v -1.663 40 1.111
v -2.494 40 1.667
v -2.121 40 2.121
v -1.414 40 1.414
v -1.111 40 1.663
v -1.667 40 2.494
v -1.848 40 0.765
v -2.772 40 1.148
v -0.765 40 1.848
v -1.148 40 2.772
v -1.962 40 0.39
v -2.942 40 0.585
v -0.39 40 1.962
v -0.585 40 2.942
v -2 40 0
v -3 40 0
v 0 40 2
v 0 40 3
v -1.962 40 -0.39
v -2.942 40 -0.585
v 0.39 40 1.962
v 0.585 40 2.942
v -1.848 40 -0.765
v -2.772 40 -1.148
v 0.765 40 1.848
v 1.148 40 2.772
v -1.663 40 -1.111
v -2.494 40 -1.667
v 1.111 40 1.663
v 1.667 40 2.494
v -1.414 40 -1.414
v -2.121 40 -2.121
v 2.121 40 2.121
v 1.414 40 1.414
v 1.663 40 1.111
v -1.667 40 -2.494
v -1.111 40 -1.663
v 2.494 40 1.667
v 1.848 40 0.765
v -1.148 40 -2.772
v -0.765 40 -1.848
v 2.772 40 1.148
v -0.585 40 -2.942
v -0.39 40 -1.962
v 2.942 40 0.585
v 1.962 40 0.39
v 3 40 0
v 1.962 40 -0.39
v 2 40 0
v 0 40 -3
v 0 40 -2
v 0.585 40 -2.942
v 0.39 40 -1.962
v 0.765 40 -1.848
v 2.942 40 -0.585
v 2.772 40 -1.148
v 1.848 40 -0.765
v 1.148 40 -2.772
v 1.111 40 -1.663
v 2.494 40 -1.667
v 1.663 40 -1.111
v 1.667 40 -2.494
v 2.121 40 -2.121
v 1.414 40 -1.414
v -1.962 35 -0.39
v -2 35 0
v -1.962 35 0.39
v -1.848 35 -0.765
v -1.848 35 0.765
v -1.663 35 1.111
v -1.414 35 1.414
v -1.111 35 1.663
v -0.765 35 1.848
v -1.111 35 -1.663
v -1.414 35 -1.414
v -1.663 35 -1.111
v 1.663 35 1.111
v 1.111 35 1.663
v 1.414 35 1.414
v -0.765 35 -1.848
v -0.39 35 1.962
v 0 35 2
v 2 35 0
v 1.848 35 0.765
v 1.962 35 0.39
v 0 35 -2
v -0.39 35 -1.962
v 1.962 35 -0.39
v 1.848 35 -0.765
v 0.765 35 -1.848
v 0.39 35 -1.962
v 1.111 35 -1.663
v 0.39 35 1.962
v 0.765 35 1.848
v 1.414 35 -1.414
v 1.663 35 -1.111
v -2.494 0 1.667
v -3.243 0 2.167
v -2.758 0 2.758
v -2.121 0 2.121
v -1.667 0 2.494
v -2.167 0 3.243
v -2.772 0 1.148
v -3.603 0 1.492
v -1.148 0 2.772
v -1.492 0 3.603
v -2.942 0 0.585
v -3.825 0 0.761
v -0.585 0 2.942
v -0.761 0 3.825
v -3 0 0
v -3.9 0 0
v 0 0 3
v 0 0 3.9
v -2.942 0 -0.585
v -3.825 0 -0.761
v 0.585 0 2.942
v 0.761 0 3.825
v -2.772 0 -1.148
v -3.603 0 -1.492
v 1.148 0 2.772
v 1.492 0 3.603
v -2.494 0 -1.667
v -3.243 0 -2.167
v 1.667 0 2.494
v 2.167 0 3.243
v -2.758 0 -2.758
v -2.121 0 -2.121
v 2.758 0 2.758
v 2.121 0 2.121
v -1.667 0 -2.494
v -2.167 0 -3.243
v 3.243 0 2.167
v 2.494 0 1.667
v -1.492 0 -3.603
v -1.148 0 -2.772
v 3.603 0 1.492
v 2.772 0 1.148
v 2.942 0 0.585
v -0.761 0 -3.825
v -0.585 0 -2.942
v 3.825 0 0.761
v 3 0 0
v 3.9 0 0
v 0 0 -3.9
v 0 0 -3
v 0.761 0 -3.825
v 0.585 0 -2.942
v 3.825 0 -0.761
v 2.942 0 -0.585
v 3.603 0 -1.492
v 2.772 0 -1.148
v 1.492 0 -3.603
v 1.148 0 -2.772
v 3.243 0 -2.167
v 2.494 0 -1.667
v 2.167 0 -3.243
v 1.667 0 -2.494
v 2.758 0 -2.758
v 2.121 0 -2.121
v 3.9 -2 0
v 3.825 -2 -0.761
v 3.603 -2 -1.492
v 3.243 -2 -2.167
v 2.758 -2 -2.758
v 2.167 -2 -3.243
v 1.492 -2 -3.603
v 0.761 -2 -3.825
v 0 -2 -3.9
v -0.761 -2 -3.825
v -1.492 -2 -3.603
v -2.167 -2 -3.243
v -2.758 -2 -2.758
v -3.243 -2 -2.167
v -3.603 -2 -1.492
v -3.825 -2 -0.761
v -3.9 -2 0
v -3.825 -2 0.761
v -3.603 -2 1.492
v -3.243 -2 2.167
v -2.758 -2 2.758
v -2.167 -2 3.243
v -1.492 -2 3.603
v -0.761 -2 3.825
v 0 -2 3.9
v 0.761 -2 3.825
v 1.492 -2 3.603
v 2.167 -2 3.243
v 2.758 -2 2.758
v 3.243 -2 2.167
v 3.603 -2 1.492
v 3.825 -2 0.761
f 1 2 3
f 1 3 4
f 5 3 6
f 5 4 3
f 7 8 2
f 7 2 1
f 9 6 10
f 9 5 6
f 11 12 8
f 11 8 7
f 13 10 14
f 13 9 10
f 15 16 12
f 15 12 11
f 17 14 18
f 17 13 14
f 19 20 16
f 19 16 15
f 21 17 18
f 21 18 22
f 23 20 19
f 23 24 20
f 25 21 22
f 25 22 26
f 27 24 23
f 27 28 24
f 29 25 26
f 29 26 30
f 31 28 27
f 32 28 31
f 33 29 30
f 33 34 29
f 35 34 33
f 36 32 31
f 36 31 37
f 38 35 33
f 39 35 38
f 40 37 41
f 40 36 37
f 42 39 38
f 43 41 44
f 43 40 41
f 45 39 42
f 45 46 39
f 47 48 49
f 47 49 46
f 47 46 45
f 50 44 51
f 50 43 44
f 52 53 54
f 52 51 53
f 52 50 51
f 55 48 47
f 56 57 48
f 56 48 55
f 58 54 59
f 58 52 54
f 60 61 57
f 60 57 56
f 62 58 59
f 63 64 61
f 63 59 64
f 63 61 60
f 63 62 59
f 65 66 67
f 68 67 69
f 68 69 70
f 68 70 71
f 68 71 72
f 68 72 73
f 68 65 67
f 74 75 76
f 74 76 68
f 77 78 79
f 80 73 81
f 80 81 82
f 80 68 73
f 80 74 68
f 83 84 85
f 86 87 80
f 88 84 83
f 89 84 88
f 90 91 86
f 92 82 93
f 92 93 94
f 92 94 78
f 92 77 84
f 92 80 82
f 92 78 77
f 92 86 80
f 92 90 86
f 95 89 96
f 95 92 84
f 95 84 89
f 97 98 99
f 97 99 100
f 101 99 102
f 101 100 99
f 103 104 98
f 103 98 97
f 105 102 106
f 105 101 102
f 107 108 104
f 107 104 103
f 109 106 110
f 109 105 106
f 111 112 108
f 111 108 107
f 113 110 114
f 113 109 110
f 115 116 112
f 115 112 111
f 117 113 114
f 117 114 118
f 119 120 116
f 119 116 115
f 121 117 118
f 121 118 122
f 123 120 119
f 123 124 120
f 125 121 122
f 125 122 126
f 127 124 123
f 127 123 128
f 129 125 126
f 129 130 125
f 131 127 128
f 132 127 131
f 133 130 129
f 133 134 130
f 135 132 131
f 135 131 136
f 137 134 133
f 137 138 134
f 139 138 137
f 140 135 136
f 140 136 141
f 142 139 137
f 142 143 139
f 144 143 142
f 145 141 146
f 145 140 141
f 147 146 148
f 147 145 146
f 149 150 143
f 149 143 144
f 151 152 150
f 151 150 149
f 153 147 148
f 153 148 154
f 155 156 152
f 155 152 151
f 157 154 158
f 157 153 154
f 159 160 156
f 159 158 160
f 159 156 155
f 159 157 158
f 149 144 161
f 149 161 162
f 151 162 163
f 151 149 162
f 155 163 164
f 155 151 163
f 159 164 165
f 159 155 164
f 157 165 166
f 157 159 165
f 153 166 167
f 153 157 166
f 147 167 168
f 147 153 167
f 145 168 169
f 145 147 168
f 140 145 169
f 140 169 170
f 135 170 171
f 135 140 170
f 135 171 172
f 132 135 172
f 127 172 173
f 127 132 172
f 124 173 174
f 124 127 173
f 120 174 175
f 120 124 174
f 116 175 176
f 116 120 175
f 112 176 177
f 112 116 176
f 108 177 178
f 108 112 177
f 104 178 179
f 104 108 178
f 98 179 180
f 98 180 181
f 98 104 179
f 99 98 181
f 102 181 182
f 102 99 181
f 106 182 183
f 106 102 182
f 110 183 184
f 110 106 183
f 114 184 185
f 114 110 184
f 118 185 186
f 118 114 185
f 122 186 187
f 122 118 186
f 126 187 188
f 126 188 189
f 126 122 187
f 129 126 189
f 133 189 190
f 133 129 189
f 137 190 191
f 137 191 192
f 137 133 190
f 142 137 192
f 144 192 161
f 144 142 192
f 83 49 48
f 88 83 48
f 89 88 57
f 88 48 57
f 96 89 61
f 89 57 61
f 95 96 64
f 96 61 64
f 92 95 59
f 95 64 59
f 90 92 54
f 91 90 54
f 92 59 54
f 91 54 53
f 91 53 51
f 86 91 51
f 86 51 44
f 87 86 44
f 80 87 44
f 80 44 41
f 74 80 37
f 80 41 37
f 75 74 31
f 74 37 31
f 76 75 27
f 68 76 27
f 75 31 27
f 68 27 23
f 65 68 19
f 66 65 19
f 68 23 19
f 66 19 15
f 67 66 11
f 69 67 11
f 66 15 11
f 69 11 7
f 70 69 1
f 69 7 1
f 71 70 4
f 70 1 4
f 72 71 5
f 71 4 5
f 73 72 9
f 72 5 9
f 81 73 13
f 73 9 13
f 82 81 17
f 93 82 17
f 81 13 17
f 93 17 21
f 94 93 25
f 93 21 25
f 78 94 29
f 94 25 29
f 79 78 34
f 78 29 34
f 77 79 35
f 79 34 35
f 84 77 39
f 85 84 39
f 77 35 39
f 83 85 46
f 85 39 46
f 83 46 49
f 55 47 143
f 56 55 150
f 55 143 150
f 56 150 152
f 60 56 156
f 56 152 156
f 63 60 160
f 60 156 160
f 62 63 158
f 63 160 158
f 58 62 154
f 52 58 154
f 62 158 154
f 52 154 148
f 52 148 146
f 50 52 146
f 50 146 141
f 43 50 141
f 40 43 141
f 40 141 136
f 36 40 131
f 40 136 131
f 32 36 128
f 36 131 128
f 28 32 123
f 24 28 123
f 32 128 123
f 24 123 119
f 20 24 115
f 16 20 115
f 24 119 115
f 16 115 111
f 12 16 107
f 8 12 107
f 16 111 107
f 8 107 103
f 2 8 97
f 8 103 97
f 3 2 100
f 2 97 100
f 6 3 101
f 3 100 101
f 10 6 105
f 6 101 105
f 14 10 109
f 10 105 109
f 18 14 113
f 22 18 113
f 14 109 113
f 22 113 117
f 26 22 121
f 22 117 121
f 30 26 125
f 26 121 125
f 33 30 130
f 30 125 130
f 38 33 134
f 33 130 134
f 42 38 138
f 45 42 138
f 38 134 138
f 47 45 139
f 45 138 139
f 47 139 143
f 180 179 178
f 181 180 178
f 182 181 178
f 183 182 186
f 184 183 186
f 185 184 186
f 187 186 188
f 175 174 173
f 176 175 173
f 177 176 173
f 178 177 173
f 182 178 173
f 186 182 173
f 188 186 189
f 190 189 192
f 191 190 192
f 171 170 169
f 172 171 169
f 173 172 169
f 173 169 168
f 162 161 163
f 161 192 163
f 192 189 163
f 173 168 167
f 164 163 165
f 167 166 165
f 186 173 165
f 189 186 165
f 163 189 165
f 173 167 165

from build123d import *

# Parameters (mm, degrees)
SKETCH1_R           = 3.9
BOSS_EXTRUDE1_DEPTH = 2
SKETCH2_R           = 3
BOSS_EXTRUDE2_DEPTH = 40
SKETCH3_R           = 2
CUT_EXTRUDE1_DEPTH  = 5


with BuildPart() as part:
    # Sketch1 → Boss-Extrude1 (new body)
    with BuildSketch(Plane(origin=(0, 0, 0), x_dir=(1, 0, 0), z_dir=(0, 1, 0))):
        Circle(SKETCH1_R)
    extrude(amount=-BOSS_EXTRUDE1_DEPTH)

    # Sketch2 → Boss-Extrude2 (add)
    with BuildSketch(Plane(origin=(0, 0, 0), x_dir=(1, 0, 0), z_dir=(0, 1, 0))):
        Circle(SKETCH2_R)
    extrude(amount=BOSS_EXTRUDE2_DEPTH)

    # Sketch3 → Cut-Extrude1 (cut)
    with BuildSketch(Plane(origin=(0, 40, 0), x_dir=(1, 0, 0), z_dir=(0, 1, 0))):
        Circle(SKETCH3_R)
    extrude(amount=-CUT_EXTRUDE1_DEPTH, mode=Mode.SUBTRACT)


solid = part.part
